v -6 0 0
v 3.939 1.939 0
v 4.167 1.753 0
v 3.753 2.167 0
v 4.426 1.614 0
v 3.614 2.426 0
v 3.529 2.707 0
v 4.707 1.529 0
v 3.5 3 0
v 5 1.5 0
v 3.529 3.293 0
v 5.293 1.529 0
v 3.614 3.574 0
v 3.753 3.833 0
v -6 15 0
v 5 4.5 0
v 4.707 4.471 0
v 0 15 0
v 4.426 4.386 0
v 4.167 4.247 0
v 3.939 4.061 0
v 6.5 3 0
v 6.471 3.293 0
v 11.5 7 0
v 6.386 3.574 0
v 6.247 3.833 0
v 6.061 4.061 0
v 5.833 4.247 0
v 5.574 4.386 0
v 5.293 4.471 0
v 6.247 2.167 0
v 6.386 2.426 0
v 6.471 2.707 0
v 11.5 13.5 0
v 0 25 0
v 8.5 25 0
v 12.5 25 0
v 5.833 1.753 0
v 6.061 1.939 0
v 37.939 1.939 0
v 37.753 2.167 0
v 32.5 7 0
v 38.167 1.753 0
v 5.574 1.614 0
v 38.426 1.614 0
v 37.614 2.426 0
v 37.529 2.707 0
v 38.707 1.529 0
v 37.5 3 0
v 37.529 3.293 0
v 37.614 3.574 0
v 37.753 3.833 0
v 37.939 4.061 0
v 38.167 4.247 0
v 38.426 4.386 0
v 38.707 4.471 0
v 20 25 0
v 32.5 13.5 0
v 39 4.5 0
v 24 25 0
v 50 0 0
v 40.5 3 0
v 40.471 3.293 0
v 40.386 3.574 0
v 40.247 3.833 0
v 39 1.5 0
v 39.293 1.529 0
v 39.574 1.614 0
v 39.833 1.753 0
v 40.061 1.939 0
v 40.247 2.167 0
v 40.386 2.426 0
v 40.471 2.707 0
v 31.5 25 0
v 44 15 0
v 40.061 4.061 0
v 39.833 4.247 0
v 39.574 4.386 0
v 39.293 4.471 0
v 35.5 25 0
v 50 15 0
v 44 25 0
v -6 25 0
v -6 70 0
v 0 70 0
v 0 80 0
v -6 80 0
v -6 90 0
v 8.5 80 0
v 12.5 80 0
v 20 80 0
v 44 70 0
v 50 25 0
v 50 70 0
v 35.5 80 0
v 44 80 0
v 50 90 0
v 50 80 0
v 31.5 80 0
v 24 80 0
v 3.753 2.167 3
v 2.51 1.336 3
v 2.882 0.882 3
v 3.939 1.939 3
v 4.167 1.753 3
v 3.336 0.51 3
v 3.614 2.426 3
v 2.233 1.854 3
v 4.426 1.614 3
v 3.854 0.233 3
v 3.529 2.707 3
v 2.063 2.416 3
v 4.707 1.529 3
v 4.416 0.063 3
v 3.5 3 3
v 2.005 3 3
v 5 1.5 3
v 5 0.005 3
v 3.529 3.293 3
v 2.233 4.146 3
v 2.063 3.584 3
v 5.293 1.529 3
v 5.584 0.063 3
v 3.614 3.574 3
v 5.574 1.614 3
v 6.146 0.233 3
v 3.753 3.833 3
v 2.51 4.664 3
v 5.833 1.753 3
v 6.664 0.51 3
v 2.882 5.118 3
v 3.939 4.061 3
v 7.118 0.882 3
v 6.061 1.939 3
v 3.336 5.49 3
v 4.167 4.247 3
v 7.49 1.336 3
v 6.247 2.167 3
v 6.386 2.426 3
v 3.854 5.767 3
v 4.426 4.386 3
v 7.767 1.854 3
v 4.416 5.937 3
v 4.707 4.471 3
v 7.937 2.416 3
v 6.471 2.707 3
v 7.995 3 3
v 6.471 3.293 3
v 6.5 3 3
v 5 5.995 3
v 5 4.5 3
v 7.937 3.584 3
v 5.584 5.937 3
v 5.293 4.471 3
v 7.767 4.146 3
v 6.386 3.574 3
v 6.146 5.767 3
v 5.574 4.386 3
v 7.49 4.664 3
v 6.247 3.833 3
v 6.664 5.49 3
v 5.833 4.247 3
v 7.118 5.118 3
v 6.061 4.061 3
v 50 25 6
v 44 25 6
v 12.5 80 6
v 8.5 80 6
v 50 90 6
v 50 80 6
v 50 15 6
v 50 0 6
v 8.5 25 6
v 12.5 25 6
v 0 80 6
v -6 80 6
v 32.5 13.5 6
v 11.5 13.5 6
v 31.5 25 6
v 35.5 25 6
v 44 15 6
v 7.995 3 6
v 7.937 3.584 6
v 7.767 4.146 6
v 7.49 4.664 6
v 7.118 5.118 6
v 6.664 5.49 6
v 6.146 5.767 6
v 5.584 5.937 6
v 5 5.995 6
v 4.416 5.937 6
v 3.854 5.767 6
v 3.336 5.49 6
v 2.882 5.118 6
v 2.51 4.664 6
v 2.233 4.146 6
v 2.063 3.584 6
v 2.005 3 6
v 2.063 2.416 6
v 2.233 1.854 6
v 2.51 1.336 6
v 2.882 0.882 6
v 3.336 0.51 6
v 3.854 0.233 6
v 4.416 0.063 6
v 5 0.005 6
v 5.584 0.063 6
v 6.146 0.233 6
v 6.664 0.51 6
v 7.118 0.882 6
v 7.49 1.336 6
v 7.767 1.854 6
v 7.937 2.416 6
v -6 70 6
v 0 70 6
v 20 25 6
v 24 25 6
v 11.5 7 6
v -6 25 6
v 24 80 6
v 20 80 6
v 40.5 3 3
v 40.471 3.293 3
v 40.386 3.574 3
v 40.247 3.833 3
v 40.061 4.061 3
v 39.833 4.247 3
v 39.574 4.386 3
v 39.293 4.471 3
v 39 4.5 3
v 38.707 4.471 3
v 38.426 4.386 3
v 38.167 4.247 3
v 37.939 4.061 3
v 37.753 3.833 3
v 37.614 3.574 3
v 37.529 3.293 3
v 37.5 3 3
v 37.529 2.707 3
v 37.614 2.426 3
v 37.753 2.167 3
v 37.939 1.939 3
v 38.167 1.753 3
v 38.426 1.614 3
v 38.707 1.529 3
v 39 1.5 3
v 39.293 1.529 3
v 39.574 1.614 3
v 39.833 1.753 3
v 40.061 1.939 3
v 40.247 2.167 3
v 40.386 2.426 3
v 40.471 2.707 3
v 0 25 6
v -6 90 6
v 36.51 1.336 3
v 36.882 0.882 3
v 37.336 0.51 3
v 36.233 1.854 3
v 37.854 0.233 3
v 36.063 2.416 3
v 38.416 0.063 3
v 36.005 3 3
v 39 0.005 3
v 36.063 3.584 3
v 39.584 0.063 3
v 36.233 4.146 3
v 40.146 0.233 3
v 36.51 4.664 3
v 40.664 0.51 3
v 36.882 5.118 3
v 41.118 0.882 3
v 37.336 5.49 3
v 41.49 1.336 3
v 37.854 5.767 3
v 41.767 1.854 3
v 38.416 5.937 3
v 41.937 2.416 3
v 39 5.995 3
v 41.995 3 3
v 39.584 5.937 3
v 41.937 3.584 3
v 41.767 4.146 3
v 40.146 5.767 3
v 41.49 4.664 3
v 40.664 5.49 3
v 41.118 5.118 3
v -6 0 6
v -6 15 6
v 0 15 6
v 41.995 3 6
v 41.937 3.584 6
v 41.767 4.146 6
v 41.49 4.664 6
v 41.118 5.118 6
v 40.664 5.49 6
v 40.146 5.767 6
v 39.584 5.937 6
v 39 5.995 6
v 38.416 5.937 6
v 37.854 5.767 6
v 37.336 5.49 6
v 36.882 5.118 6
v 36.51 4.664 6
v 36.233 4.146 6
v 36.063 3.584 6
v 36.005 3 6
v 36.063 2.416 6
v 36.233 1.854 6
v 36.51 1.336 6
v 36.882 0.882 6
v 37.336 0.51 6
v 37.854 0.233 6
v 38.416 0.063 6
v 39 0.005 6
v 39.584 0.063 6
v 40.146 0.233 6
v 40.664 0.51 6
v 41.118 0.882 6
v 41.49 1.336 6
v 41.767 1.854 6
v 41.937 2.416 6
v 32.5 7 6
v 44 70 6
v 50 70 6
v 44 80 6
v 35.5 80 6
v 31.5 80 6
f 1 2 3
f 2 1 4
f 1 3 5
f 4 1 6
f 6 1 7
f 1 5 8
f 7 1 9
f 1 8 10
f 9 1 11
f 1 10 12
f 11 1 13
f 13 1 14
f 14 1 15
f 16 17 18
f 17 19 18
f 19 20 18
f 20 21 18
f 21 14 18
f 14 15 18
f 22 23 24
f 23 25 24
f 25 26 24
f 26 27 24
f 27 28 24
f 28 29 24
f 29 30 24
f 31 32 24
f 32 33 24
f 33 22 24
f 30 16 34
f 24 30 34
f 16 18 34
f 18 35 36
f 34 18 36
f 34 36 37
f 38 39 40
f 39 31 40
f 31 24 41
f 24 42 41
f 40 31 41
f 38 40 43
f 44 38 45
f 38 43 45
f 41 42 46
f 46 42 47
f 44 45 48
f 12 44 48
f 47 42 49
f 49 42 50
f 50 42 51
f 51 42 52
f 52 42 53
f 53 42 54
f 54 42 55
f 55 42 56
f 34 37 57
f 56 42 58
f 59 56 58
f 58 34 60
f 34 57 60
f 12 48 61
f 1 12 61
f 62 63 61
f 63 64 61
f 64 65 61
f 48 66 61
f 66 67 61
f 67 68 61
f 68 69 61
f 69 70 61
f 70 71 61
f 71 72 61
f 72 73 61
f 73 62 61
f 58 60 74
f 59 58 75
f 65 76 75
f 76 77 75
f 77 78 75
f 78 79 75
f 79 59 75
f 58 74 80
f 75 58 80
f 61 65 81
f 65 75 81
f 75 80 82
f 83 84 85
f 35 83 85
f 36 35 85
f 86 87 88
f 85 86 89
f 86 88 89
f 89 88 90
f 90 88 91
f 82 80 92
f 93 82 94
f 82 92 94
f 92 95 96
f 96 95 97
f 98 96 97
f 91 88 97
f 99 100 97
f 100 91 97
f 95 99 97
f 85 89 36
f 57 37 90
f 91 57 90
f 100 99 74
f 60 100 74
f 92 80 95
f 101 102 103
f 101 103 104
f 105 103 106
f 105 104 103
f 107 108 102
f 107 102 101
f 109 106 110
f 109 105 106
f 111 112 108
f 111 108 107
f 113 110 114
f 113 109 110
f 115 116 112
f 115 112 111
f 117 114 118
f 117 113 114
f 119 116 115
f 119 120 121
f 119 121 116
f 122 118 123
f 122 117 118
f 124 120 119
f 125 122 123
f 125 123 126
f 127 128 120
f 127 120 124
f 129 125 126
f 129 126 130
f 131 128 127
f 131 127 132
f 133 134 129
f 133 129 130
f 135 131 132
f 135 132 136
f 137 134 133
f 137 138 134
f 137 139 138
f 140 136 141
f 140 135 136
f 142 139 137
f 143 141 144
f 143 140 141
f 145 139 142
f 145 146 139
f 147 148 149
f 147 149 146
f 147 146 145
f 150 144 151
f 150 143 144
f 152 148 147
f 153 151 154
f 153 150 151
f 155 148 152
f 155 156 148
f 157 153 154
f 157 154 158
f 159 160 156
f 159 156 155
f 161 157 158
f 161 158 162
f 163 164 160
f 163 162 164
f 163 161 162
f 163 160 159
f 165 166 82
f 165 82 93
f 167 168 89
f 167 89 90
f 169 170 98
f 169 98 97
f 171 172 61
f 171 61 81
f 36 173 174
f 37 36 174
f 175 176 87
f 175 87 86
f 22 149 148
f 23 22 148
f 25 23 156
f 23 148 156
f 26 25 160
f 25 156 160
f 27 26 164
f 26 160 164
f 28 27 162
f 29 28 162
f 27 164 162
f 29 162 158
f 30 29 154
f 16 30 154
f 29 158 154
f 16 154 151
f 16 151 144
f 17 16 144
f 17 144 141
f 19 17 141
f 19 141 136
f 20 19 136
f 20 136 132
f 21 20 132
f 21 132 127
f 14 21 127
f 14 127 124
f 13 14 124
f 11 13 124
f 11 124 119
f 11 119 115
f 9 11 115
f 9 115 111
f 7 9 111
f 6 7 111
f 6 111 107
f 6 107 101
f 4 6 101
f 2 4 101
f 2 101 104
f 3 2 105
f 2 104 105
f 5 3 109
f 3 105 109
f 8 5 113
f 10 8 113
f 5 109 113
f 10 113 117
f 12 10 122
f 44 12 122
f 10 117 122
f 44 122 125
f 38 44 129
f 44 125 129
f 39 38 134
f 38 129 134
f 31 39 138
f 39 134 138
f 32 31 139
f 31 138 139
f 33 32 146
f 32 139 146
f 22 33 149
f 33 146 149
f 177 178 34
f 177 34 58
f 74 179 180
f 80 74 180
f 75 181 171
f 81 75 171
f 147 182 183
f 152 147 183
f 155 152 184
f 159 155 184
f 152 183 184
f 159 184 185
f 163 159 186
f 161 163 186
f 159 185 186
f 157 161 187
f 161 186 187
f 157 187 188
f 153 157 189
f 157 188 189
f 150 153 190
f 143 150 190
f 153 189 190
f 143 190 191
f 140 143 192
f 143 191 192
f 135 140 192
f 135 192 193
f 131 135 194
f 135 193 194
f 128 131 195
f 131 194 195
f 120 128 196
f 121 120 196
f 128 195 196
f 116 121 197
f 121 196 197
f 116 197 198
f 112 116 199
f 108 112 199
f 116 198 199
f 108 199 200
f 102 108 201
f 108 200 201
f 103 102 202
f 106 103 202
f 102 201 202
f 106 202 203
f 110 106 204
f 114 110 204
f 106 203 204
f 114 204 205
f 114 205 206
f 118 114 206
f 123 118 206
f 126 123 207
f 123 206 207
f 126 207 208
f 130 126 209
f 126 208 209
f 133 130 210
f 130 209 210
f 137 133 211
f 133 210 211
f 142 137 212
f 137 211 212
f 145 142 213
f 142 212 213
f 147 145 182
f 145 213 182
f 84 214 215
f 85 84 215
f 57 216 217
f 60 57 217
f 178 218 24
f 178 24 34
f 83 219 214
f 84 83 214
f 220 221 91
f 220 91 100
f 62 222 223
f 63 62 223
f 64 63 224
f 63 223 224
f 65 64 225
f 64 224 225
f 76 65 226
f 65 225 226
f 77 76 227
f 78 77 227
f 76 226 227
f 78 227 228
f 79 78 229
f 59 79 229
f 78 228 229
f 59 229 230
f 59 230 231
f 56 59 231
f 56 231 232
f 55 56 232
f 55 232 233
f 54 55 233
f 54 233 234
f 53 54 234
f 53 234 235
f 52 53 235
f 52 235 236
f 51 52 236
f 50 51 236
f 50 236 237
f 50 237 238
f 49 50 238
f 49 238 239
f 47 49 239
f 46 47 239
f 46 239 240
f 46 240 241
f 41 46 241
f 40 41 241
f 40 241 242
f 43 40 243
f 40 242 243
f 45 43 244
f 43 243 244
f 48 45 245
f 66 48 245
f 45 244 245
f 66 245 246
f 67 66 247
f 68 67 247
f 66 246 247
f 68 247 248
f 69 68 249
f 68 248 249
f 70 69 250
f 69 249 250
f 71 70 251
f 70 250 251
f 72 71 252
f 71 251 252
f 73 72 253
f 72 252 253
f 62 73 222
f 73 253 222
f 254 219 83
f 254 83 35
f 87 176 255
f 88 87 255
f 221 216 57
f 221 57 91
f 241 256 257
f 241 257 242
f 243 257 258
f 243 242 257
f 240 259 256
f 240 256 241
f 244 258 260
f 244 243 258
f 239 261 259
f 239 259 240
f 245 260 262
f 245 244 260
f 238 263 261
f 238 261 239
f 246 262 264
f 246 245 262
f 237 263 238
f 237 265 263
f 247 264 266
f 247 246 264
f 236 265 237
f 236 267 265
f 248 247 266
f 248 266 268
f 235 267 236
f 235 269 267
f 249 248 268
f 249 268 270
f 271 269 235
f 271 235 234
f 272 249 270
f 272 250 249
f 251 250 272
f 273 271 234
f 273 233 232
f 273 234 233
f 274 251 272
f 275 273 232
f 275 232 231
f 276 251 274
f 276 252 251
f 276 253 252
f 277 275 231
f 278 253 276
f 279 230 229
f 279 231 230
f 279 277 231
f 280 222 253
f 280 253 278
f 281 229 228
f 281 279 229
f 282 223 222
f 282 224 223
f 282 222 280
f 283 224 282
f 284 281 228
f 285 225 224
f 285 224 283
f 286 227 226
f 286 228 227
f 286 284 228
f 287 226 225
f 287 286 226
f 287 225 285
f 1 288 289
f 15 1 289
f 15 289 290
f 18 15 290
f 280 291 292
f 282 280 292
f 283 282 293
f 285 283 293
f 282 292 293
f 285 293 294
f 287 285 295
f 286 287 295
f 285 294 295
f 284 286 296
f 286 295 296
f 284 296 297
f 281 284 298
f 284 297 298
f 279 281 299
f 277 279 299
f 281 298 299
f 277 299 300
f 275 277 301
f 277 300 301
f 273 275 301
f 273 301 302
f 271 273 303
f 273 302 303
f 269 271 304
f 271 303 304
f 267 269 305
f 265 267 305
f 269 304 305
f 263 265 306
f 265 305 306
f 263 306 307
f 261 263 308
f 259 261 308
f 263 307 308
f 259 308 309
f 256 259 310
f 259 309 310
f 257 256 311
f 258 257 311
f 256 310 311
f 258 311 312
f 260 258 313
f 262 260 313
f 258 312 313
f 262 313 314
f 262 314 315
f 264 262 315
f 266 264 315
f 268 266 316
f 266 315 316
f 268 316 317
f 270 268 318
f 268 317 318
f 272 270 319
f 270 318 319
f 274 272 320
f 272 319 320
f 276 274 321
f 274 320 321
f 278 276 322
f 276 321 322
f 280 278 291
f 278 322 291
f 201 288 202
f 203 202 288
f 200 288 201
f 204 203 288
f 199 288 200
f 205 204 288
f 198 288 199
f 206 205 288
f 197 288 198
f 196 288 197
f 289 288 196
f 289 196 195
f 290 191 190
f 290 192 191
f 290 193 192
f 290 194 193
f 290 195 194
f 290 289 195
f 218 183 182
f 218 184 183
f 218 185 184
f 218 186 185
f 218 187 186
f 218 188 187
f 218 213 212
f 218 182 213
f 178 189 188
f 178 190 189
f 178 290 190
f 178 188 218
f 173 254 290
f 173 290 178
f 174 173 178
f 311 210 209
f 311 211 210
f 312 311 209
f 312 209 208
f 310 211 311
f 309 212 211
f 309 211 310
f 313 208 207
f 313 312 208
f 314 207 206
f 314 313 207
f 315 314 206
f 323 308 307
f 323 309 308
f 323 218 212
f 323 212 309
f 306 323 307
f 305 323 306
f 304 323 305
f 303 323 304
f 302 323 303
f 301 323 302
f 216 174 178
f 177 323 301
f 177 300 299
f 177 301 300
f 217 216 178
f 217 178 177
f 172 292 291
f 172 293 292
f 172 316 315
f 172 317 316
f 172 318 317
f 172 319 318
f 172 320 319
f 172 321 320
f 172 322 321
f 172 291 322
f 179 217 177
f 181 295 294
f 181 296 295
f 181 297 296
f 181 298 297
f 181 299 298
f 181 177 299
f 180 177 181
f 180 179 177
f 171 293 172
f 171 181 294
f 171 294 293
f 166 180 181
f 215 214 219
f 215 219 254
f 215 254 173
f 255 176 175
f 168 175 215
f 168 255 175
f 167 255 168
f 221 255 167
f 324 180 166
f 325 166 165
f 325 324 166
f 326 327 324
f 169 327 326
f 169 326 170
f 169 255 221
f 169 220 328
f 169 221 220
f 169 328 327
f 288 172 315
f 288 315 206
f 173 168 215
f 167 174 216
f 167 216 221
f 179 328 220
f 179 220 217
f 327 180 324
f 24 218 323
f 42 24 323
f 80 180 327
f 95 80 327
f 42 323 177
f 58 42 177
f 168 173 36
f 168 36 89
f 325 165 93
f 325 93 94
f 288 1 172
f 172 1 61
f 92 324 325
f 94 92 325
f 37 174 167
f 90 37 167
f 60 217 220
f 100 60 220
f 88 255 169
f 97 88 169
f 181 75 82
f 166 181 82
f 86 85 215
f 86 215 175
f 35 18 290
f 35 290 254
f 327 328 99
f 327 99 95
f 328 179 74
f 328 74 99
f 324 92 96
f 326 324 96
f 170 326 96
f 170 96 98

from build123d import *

# Parameters (mm, degrees)
ESQUISSE1_W             = 44
ESQUISSE1_H             = 90
BOSS_EXTRU_1_DEPTH      = 6
ESQUISSE2_W             = 21
ESQUISSE2_H             = 6.5
ESQUISSE2_W_2           = 4
ESQUISSE2_H_2           = 55
ENL_V_MAT_EXTRU_1_DEPTH = 6
ESQUISSE4_W             = 6
ESQUISSE4_H             = 10
ESQUISSE4_H_2           = 45
ESQUISSE4_H_3           = 15
BOSS_EXTRU_2_DEPTH      = 6
ESQUISSE6_R             = 1.5
ENL_V_MAT_EXTRU_3_DEPTH = 6
ESQUISSE8_R             = 2.995
ENL_V_MAT_EXTRU_4_DEPTH = 3


with BuildPart() as part:
    # Esquisse1 → Boss.-Extru.1 (new body)
    with BuildSketch(Plane.XY):
        with Locations((22, 45)):
            Rectangle(ESQUISSE1_W, ESQUISSE1_H)
    extrude(amount=BOSS_EXTRU_1_DEPTH)

    # Esquisse2 → Enlèv. mat.-Extru.1 (cut)
    with BuildSketch(Plane.XY.offset(6)):
        with Locations((22, 10.25)):
            Rectangle(ESQUISSE2_W, ESQUISSE2_H)
        with Locations((22, 52.5)):
            Rectangle(ESQUISSE2_W_2, ESQUISSE2_H_2)
        with Locations((33.5, 52.5)):
            Rectangle(ESQUISSE2_W_2, ESQUISSE2_H_2)
        with Locations((10.5, 52.5)):
            Rectangle(ESQUISSE2_W_2, ESQUISSE2_H_2)
    extrude(amount=-ENL_V_MAT_EXTRU_1_DEPTH, mode=Mode.SUBTRACT)

    # Esquisse4 → Boss.-Extru.2 (add)
    with BuildSketch(Plane.XY.offset(6)):
        with Locations((-3, 85)):
            Rectangle(ESQUISSE4_W, ESQUISSE4_H)
        with Locations((-3, 47.5)):
            Rectangle(ESQUISSE4_W, ESQUISSE4_H_2)
        with Locations((-3, 7.5)):
            Rectangle(ESQUISSE4_W, ESQUISSE4_H_3)
        with Locations((47, 7.5)):
            Rectangle(ESQUISSE4_W, ESQUISSE4_H_3)
        with Locations((47, 47.5)):
            Rectangle(ESQUISSE4_W, ESQUISSE4_H_2)
        with Locations((47, 85)):
            Rectangle(ESQUISSE4_W, ESQUISSE4_H)
    extrude(amount=-BOSS_EXTRU_2_DEPTH)

    # Esquisse6 → Enlèv. mat.-Extru.3 (cut)
    with BuildSketch(Plane.XY.offset(6)):
        with Locations((5, 3)):
            Circle(ESQUISSE6_R)
        with Locations((39, 3)):
            Circle(ESQUISSE6_R)
    extrude(amount=-ENL_V_MAT_EXTRU_3_DEPTH, mode=Mode.SUBTRACT)

    # Esquisse8 → Enlèv. mat.-Extru.4 (cut)
    with BuildSketch(Plane.XY.offset(6)):
        with Locations((5, 3)):
            Circle(ESQUISSE8_R)
        with Locations((39, 3)):
            Circle(ESQUISSE8_R)
    extrude(amount=-ENL_V_MAT_EXTRU_4_DEPTH, mode=Mode.SUBTRACT)


solid = part.part
